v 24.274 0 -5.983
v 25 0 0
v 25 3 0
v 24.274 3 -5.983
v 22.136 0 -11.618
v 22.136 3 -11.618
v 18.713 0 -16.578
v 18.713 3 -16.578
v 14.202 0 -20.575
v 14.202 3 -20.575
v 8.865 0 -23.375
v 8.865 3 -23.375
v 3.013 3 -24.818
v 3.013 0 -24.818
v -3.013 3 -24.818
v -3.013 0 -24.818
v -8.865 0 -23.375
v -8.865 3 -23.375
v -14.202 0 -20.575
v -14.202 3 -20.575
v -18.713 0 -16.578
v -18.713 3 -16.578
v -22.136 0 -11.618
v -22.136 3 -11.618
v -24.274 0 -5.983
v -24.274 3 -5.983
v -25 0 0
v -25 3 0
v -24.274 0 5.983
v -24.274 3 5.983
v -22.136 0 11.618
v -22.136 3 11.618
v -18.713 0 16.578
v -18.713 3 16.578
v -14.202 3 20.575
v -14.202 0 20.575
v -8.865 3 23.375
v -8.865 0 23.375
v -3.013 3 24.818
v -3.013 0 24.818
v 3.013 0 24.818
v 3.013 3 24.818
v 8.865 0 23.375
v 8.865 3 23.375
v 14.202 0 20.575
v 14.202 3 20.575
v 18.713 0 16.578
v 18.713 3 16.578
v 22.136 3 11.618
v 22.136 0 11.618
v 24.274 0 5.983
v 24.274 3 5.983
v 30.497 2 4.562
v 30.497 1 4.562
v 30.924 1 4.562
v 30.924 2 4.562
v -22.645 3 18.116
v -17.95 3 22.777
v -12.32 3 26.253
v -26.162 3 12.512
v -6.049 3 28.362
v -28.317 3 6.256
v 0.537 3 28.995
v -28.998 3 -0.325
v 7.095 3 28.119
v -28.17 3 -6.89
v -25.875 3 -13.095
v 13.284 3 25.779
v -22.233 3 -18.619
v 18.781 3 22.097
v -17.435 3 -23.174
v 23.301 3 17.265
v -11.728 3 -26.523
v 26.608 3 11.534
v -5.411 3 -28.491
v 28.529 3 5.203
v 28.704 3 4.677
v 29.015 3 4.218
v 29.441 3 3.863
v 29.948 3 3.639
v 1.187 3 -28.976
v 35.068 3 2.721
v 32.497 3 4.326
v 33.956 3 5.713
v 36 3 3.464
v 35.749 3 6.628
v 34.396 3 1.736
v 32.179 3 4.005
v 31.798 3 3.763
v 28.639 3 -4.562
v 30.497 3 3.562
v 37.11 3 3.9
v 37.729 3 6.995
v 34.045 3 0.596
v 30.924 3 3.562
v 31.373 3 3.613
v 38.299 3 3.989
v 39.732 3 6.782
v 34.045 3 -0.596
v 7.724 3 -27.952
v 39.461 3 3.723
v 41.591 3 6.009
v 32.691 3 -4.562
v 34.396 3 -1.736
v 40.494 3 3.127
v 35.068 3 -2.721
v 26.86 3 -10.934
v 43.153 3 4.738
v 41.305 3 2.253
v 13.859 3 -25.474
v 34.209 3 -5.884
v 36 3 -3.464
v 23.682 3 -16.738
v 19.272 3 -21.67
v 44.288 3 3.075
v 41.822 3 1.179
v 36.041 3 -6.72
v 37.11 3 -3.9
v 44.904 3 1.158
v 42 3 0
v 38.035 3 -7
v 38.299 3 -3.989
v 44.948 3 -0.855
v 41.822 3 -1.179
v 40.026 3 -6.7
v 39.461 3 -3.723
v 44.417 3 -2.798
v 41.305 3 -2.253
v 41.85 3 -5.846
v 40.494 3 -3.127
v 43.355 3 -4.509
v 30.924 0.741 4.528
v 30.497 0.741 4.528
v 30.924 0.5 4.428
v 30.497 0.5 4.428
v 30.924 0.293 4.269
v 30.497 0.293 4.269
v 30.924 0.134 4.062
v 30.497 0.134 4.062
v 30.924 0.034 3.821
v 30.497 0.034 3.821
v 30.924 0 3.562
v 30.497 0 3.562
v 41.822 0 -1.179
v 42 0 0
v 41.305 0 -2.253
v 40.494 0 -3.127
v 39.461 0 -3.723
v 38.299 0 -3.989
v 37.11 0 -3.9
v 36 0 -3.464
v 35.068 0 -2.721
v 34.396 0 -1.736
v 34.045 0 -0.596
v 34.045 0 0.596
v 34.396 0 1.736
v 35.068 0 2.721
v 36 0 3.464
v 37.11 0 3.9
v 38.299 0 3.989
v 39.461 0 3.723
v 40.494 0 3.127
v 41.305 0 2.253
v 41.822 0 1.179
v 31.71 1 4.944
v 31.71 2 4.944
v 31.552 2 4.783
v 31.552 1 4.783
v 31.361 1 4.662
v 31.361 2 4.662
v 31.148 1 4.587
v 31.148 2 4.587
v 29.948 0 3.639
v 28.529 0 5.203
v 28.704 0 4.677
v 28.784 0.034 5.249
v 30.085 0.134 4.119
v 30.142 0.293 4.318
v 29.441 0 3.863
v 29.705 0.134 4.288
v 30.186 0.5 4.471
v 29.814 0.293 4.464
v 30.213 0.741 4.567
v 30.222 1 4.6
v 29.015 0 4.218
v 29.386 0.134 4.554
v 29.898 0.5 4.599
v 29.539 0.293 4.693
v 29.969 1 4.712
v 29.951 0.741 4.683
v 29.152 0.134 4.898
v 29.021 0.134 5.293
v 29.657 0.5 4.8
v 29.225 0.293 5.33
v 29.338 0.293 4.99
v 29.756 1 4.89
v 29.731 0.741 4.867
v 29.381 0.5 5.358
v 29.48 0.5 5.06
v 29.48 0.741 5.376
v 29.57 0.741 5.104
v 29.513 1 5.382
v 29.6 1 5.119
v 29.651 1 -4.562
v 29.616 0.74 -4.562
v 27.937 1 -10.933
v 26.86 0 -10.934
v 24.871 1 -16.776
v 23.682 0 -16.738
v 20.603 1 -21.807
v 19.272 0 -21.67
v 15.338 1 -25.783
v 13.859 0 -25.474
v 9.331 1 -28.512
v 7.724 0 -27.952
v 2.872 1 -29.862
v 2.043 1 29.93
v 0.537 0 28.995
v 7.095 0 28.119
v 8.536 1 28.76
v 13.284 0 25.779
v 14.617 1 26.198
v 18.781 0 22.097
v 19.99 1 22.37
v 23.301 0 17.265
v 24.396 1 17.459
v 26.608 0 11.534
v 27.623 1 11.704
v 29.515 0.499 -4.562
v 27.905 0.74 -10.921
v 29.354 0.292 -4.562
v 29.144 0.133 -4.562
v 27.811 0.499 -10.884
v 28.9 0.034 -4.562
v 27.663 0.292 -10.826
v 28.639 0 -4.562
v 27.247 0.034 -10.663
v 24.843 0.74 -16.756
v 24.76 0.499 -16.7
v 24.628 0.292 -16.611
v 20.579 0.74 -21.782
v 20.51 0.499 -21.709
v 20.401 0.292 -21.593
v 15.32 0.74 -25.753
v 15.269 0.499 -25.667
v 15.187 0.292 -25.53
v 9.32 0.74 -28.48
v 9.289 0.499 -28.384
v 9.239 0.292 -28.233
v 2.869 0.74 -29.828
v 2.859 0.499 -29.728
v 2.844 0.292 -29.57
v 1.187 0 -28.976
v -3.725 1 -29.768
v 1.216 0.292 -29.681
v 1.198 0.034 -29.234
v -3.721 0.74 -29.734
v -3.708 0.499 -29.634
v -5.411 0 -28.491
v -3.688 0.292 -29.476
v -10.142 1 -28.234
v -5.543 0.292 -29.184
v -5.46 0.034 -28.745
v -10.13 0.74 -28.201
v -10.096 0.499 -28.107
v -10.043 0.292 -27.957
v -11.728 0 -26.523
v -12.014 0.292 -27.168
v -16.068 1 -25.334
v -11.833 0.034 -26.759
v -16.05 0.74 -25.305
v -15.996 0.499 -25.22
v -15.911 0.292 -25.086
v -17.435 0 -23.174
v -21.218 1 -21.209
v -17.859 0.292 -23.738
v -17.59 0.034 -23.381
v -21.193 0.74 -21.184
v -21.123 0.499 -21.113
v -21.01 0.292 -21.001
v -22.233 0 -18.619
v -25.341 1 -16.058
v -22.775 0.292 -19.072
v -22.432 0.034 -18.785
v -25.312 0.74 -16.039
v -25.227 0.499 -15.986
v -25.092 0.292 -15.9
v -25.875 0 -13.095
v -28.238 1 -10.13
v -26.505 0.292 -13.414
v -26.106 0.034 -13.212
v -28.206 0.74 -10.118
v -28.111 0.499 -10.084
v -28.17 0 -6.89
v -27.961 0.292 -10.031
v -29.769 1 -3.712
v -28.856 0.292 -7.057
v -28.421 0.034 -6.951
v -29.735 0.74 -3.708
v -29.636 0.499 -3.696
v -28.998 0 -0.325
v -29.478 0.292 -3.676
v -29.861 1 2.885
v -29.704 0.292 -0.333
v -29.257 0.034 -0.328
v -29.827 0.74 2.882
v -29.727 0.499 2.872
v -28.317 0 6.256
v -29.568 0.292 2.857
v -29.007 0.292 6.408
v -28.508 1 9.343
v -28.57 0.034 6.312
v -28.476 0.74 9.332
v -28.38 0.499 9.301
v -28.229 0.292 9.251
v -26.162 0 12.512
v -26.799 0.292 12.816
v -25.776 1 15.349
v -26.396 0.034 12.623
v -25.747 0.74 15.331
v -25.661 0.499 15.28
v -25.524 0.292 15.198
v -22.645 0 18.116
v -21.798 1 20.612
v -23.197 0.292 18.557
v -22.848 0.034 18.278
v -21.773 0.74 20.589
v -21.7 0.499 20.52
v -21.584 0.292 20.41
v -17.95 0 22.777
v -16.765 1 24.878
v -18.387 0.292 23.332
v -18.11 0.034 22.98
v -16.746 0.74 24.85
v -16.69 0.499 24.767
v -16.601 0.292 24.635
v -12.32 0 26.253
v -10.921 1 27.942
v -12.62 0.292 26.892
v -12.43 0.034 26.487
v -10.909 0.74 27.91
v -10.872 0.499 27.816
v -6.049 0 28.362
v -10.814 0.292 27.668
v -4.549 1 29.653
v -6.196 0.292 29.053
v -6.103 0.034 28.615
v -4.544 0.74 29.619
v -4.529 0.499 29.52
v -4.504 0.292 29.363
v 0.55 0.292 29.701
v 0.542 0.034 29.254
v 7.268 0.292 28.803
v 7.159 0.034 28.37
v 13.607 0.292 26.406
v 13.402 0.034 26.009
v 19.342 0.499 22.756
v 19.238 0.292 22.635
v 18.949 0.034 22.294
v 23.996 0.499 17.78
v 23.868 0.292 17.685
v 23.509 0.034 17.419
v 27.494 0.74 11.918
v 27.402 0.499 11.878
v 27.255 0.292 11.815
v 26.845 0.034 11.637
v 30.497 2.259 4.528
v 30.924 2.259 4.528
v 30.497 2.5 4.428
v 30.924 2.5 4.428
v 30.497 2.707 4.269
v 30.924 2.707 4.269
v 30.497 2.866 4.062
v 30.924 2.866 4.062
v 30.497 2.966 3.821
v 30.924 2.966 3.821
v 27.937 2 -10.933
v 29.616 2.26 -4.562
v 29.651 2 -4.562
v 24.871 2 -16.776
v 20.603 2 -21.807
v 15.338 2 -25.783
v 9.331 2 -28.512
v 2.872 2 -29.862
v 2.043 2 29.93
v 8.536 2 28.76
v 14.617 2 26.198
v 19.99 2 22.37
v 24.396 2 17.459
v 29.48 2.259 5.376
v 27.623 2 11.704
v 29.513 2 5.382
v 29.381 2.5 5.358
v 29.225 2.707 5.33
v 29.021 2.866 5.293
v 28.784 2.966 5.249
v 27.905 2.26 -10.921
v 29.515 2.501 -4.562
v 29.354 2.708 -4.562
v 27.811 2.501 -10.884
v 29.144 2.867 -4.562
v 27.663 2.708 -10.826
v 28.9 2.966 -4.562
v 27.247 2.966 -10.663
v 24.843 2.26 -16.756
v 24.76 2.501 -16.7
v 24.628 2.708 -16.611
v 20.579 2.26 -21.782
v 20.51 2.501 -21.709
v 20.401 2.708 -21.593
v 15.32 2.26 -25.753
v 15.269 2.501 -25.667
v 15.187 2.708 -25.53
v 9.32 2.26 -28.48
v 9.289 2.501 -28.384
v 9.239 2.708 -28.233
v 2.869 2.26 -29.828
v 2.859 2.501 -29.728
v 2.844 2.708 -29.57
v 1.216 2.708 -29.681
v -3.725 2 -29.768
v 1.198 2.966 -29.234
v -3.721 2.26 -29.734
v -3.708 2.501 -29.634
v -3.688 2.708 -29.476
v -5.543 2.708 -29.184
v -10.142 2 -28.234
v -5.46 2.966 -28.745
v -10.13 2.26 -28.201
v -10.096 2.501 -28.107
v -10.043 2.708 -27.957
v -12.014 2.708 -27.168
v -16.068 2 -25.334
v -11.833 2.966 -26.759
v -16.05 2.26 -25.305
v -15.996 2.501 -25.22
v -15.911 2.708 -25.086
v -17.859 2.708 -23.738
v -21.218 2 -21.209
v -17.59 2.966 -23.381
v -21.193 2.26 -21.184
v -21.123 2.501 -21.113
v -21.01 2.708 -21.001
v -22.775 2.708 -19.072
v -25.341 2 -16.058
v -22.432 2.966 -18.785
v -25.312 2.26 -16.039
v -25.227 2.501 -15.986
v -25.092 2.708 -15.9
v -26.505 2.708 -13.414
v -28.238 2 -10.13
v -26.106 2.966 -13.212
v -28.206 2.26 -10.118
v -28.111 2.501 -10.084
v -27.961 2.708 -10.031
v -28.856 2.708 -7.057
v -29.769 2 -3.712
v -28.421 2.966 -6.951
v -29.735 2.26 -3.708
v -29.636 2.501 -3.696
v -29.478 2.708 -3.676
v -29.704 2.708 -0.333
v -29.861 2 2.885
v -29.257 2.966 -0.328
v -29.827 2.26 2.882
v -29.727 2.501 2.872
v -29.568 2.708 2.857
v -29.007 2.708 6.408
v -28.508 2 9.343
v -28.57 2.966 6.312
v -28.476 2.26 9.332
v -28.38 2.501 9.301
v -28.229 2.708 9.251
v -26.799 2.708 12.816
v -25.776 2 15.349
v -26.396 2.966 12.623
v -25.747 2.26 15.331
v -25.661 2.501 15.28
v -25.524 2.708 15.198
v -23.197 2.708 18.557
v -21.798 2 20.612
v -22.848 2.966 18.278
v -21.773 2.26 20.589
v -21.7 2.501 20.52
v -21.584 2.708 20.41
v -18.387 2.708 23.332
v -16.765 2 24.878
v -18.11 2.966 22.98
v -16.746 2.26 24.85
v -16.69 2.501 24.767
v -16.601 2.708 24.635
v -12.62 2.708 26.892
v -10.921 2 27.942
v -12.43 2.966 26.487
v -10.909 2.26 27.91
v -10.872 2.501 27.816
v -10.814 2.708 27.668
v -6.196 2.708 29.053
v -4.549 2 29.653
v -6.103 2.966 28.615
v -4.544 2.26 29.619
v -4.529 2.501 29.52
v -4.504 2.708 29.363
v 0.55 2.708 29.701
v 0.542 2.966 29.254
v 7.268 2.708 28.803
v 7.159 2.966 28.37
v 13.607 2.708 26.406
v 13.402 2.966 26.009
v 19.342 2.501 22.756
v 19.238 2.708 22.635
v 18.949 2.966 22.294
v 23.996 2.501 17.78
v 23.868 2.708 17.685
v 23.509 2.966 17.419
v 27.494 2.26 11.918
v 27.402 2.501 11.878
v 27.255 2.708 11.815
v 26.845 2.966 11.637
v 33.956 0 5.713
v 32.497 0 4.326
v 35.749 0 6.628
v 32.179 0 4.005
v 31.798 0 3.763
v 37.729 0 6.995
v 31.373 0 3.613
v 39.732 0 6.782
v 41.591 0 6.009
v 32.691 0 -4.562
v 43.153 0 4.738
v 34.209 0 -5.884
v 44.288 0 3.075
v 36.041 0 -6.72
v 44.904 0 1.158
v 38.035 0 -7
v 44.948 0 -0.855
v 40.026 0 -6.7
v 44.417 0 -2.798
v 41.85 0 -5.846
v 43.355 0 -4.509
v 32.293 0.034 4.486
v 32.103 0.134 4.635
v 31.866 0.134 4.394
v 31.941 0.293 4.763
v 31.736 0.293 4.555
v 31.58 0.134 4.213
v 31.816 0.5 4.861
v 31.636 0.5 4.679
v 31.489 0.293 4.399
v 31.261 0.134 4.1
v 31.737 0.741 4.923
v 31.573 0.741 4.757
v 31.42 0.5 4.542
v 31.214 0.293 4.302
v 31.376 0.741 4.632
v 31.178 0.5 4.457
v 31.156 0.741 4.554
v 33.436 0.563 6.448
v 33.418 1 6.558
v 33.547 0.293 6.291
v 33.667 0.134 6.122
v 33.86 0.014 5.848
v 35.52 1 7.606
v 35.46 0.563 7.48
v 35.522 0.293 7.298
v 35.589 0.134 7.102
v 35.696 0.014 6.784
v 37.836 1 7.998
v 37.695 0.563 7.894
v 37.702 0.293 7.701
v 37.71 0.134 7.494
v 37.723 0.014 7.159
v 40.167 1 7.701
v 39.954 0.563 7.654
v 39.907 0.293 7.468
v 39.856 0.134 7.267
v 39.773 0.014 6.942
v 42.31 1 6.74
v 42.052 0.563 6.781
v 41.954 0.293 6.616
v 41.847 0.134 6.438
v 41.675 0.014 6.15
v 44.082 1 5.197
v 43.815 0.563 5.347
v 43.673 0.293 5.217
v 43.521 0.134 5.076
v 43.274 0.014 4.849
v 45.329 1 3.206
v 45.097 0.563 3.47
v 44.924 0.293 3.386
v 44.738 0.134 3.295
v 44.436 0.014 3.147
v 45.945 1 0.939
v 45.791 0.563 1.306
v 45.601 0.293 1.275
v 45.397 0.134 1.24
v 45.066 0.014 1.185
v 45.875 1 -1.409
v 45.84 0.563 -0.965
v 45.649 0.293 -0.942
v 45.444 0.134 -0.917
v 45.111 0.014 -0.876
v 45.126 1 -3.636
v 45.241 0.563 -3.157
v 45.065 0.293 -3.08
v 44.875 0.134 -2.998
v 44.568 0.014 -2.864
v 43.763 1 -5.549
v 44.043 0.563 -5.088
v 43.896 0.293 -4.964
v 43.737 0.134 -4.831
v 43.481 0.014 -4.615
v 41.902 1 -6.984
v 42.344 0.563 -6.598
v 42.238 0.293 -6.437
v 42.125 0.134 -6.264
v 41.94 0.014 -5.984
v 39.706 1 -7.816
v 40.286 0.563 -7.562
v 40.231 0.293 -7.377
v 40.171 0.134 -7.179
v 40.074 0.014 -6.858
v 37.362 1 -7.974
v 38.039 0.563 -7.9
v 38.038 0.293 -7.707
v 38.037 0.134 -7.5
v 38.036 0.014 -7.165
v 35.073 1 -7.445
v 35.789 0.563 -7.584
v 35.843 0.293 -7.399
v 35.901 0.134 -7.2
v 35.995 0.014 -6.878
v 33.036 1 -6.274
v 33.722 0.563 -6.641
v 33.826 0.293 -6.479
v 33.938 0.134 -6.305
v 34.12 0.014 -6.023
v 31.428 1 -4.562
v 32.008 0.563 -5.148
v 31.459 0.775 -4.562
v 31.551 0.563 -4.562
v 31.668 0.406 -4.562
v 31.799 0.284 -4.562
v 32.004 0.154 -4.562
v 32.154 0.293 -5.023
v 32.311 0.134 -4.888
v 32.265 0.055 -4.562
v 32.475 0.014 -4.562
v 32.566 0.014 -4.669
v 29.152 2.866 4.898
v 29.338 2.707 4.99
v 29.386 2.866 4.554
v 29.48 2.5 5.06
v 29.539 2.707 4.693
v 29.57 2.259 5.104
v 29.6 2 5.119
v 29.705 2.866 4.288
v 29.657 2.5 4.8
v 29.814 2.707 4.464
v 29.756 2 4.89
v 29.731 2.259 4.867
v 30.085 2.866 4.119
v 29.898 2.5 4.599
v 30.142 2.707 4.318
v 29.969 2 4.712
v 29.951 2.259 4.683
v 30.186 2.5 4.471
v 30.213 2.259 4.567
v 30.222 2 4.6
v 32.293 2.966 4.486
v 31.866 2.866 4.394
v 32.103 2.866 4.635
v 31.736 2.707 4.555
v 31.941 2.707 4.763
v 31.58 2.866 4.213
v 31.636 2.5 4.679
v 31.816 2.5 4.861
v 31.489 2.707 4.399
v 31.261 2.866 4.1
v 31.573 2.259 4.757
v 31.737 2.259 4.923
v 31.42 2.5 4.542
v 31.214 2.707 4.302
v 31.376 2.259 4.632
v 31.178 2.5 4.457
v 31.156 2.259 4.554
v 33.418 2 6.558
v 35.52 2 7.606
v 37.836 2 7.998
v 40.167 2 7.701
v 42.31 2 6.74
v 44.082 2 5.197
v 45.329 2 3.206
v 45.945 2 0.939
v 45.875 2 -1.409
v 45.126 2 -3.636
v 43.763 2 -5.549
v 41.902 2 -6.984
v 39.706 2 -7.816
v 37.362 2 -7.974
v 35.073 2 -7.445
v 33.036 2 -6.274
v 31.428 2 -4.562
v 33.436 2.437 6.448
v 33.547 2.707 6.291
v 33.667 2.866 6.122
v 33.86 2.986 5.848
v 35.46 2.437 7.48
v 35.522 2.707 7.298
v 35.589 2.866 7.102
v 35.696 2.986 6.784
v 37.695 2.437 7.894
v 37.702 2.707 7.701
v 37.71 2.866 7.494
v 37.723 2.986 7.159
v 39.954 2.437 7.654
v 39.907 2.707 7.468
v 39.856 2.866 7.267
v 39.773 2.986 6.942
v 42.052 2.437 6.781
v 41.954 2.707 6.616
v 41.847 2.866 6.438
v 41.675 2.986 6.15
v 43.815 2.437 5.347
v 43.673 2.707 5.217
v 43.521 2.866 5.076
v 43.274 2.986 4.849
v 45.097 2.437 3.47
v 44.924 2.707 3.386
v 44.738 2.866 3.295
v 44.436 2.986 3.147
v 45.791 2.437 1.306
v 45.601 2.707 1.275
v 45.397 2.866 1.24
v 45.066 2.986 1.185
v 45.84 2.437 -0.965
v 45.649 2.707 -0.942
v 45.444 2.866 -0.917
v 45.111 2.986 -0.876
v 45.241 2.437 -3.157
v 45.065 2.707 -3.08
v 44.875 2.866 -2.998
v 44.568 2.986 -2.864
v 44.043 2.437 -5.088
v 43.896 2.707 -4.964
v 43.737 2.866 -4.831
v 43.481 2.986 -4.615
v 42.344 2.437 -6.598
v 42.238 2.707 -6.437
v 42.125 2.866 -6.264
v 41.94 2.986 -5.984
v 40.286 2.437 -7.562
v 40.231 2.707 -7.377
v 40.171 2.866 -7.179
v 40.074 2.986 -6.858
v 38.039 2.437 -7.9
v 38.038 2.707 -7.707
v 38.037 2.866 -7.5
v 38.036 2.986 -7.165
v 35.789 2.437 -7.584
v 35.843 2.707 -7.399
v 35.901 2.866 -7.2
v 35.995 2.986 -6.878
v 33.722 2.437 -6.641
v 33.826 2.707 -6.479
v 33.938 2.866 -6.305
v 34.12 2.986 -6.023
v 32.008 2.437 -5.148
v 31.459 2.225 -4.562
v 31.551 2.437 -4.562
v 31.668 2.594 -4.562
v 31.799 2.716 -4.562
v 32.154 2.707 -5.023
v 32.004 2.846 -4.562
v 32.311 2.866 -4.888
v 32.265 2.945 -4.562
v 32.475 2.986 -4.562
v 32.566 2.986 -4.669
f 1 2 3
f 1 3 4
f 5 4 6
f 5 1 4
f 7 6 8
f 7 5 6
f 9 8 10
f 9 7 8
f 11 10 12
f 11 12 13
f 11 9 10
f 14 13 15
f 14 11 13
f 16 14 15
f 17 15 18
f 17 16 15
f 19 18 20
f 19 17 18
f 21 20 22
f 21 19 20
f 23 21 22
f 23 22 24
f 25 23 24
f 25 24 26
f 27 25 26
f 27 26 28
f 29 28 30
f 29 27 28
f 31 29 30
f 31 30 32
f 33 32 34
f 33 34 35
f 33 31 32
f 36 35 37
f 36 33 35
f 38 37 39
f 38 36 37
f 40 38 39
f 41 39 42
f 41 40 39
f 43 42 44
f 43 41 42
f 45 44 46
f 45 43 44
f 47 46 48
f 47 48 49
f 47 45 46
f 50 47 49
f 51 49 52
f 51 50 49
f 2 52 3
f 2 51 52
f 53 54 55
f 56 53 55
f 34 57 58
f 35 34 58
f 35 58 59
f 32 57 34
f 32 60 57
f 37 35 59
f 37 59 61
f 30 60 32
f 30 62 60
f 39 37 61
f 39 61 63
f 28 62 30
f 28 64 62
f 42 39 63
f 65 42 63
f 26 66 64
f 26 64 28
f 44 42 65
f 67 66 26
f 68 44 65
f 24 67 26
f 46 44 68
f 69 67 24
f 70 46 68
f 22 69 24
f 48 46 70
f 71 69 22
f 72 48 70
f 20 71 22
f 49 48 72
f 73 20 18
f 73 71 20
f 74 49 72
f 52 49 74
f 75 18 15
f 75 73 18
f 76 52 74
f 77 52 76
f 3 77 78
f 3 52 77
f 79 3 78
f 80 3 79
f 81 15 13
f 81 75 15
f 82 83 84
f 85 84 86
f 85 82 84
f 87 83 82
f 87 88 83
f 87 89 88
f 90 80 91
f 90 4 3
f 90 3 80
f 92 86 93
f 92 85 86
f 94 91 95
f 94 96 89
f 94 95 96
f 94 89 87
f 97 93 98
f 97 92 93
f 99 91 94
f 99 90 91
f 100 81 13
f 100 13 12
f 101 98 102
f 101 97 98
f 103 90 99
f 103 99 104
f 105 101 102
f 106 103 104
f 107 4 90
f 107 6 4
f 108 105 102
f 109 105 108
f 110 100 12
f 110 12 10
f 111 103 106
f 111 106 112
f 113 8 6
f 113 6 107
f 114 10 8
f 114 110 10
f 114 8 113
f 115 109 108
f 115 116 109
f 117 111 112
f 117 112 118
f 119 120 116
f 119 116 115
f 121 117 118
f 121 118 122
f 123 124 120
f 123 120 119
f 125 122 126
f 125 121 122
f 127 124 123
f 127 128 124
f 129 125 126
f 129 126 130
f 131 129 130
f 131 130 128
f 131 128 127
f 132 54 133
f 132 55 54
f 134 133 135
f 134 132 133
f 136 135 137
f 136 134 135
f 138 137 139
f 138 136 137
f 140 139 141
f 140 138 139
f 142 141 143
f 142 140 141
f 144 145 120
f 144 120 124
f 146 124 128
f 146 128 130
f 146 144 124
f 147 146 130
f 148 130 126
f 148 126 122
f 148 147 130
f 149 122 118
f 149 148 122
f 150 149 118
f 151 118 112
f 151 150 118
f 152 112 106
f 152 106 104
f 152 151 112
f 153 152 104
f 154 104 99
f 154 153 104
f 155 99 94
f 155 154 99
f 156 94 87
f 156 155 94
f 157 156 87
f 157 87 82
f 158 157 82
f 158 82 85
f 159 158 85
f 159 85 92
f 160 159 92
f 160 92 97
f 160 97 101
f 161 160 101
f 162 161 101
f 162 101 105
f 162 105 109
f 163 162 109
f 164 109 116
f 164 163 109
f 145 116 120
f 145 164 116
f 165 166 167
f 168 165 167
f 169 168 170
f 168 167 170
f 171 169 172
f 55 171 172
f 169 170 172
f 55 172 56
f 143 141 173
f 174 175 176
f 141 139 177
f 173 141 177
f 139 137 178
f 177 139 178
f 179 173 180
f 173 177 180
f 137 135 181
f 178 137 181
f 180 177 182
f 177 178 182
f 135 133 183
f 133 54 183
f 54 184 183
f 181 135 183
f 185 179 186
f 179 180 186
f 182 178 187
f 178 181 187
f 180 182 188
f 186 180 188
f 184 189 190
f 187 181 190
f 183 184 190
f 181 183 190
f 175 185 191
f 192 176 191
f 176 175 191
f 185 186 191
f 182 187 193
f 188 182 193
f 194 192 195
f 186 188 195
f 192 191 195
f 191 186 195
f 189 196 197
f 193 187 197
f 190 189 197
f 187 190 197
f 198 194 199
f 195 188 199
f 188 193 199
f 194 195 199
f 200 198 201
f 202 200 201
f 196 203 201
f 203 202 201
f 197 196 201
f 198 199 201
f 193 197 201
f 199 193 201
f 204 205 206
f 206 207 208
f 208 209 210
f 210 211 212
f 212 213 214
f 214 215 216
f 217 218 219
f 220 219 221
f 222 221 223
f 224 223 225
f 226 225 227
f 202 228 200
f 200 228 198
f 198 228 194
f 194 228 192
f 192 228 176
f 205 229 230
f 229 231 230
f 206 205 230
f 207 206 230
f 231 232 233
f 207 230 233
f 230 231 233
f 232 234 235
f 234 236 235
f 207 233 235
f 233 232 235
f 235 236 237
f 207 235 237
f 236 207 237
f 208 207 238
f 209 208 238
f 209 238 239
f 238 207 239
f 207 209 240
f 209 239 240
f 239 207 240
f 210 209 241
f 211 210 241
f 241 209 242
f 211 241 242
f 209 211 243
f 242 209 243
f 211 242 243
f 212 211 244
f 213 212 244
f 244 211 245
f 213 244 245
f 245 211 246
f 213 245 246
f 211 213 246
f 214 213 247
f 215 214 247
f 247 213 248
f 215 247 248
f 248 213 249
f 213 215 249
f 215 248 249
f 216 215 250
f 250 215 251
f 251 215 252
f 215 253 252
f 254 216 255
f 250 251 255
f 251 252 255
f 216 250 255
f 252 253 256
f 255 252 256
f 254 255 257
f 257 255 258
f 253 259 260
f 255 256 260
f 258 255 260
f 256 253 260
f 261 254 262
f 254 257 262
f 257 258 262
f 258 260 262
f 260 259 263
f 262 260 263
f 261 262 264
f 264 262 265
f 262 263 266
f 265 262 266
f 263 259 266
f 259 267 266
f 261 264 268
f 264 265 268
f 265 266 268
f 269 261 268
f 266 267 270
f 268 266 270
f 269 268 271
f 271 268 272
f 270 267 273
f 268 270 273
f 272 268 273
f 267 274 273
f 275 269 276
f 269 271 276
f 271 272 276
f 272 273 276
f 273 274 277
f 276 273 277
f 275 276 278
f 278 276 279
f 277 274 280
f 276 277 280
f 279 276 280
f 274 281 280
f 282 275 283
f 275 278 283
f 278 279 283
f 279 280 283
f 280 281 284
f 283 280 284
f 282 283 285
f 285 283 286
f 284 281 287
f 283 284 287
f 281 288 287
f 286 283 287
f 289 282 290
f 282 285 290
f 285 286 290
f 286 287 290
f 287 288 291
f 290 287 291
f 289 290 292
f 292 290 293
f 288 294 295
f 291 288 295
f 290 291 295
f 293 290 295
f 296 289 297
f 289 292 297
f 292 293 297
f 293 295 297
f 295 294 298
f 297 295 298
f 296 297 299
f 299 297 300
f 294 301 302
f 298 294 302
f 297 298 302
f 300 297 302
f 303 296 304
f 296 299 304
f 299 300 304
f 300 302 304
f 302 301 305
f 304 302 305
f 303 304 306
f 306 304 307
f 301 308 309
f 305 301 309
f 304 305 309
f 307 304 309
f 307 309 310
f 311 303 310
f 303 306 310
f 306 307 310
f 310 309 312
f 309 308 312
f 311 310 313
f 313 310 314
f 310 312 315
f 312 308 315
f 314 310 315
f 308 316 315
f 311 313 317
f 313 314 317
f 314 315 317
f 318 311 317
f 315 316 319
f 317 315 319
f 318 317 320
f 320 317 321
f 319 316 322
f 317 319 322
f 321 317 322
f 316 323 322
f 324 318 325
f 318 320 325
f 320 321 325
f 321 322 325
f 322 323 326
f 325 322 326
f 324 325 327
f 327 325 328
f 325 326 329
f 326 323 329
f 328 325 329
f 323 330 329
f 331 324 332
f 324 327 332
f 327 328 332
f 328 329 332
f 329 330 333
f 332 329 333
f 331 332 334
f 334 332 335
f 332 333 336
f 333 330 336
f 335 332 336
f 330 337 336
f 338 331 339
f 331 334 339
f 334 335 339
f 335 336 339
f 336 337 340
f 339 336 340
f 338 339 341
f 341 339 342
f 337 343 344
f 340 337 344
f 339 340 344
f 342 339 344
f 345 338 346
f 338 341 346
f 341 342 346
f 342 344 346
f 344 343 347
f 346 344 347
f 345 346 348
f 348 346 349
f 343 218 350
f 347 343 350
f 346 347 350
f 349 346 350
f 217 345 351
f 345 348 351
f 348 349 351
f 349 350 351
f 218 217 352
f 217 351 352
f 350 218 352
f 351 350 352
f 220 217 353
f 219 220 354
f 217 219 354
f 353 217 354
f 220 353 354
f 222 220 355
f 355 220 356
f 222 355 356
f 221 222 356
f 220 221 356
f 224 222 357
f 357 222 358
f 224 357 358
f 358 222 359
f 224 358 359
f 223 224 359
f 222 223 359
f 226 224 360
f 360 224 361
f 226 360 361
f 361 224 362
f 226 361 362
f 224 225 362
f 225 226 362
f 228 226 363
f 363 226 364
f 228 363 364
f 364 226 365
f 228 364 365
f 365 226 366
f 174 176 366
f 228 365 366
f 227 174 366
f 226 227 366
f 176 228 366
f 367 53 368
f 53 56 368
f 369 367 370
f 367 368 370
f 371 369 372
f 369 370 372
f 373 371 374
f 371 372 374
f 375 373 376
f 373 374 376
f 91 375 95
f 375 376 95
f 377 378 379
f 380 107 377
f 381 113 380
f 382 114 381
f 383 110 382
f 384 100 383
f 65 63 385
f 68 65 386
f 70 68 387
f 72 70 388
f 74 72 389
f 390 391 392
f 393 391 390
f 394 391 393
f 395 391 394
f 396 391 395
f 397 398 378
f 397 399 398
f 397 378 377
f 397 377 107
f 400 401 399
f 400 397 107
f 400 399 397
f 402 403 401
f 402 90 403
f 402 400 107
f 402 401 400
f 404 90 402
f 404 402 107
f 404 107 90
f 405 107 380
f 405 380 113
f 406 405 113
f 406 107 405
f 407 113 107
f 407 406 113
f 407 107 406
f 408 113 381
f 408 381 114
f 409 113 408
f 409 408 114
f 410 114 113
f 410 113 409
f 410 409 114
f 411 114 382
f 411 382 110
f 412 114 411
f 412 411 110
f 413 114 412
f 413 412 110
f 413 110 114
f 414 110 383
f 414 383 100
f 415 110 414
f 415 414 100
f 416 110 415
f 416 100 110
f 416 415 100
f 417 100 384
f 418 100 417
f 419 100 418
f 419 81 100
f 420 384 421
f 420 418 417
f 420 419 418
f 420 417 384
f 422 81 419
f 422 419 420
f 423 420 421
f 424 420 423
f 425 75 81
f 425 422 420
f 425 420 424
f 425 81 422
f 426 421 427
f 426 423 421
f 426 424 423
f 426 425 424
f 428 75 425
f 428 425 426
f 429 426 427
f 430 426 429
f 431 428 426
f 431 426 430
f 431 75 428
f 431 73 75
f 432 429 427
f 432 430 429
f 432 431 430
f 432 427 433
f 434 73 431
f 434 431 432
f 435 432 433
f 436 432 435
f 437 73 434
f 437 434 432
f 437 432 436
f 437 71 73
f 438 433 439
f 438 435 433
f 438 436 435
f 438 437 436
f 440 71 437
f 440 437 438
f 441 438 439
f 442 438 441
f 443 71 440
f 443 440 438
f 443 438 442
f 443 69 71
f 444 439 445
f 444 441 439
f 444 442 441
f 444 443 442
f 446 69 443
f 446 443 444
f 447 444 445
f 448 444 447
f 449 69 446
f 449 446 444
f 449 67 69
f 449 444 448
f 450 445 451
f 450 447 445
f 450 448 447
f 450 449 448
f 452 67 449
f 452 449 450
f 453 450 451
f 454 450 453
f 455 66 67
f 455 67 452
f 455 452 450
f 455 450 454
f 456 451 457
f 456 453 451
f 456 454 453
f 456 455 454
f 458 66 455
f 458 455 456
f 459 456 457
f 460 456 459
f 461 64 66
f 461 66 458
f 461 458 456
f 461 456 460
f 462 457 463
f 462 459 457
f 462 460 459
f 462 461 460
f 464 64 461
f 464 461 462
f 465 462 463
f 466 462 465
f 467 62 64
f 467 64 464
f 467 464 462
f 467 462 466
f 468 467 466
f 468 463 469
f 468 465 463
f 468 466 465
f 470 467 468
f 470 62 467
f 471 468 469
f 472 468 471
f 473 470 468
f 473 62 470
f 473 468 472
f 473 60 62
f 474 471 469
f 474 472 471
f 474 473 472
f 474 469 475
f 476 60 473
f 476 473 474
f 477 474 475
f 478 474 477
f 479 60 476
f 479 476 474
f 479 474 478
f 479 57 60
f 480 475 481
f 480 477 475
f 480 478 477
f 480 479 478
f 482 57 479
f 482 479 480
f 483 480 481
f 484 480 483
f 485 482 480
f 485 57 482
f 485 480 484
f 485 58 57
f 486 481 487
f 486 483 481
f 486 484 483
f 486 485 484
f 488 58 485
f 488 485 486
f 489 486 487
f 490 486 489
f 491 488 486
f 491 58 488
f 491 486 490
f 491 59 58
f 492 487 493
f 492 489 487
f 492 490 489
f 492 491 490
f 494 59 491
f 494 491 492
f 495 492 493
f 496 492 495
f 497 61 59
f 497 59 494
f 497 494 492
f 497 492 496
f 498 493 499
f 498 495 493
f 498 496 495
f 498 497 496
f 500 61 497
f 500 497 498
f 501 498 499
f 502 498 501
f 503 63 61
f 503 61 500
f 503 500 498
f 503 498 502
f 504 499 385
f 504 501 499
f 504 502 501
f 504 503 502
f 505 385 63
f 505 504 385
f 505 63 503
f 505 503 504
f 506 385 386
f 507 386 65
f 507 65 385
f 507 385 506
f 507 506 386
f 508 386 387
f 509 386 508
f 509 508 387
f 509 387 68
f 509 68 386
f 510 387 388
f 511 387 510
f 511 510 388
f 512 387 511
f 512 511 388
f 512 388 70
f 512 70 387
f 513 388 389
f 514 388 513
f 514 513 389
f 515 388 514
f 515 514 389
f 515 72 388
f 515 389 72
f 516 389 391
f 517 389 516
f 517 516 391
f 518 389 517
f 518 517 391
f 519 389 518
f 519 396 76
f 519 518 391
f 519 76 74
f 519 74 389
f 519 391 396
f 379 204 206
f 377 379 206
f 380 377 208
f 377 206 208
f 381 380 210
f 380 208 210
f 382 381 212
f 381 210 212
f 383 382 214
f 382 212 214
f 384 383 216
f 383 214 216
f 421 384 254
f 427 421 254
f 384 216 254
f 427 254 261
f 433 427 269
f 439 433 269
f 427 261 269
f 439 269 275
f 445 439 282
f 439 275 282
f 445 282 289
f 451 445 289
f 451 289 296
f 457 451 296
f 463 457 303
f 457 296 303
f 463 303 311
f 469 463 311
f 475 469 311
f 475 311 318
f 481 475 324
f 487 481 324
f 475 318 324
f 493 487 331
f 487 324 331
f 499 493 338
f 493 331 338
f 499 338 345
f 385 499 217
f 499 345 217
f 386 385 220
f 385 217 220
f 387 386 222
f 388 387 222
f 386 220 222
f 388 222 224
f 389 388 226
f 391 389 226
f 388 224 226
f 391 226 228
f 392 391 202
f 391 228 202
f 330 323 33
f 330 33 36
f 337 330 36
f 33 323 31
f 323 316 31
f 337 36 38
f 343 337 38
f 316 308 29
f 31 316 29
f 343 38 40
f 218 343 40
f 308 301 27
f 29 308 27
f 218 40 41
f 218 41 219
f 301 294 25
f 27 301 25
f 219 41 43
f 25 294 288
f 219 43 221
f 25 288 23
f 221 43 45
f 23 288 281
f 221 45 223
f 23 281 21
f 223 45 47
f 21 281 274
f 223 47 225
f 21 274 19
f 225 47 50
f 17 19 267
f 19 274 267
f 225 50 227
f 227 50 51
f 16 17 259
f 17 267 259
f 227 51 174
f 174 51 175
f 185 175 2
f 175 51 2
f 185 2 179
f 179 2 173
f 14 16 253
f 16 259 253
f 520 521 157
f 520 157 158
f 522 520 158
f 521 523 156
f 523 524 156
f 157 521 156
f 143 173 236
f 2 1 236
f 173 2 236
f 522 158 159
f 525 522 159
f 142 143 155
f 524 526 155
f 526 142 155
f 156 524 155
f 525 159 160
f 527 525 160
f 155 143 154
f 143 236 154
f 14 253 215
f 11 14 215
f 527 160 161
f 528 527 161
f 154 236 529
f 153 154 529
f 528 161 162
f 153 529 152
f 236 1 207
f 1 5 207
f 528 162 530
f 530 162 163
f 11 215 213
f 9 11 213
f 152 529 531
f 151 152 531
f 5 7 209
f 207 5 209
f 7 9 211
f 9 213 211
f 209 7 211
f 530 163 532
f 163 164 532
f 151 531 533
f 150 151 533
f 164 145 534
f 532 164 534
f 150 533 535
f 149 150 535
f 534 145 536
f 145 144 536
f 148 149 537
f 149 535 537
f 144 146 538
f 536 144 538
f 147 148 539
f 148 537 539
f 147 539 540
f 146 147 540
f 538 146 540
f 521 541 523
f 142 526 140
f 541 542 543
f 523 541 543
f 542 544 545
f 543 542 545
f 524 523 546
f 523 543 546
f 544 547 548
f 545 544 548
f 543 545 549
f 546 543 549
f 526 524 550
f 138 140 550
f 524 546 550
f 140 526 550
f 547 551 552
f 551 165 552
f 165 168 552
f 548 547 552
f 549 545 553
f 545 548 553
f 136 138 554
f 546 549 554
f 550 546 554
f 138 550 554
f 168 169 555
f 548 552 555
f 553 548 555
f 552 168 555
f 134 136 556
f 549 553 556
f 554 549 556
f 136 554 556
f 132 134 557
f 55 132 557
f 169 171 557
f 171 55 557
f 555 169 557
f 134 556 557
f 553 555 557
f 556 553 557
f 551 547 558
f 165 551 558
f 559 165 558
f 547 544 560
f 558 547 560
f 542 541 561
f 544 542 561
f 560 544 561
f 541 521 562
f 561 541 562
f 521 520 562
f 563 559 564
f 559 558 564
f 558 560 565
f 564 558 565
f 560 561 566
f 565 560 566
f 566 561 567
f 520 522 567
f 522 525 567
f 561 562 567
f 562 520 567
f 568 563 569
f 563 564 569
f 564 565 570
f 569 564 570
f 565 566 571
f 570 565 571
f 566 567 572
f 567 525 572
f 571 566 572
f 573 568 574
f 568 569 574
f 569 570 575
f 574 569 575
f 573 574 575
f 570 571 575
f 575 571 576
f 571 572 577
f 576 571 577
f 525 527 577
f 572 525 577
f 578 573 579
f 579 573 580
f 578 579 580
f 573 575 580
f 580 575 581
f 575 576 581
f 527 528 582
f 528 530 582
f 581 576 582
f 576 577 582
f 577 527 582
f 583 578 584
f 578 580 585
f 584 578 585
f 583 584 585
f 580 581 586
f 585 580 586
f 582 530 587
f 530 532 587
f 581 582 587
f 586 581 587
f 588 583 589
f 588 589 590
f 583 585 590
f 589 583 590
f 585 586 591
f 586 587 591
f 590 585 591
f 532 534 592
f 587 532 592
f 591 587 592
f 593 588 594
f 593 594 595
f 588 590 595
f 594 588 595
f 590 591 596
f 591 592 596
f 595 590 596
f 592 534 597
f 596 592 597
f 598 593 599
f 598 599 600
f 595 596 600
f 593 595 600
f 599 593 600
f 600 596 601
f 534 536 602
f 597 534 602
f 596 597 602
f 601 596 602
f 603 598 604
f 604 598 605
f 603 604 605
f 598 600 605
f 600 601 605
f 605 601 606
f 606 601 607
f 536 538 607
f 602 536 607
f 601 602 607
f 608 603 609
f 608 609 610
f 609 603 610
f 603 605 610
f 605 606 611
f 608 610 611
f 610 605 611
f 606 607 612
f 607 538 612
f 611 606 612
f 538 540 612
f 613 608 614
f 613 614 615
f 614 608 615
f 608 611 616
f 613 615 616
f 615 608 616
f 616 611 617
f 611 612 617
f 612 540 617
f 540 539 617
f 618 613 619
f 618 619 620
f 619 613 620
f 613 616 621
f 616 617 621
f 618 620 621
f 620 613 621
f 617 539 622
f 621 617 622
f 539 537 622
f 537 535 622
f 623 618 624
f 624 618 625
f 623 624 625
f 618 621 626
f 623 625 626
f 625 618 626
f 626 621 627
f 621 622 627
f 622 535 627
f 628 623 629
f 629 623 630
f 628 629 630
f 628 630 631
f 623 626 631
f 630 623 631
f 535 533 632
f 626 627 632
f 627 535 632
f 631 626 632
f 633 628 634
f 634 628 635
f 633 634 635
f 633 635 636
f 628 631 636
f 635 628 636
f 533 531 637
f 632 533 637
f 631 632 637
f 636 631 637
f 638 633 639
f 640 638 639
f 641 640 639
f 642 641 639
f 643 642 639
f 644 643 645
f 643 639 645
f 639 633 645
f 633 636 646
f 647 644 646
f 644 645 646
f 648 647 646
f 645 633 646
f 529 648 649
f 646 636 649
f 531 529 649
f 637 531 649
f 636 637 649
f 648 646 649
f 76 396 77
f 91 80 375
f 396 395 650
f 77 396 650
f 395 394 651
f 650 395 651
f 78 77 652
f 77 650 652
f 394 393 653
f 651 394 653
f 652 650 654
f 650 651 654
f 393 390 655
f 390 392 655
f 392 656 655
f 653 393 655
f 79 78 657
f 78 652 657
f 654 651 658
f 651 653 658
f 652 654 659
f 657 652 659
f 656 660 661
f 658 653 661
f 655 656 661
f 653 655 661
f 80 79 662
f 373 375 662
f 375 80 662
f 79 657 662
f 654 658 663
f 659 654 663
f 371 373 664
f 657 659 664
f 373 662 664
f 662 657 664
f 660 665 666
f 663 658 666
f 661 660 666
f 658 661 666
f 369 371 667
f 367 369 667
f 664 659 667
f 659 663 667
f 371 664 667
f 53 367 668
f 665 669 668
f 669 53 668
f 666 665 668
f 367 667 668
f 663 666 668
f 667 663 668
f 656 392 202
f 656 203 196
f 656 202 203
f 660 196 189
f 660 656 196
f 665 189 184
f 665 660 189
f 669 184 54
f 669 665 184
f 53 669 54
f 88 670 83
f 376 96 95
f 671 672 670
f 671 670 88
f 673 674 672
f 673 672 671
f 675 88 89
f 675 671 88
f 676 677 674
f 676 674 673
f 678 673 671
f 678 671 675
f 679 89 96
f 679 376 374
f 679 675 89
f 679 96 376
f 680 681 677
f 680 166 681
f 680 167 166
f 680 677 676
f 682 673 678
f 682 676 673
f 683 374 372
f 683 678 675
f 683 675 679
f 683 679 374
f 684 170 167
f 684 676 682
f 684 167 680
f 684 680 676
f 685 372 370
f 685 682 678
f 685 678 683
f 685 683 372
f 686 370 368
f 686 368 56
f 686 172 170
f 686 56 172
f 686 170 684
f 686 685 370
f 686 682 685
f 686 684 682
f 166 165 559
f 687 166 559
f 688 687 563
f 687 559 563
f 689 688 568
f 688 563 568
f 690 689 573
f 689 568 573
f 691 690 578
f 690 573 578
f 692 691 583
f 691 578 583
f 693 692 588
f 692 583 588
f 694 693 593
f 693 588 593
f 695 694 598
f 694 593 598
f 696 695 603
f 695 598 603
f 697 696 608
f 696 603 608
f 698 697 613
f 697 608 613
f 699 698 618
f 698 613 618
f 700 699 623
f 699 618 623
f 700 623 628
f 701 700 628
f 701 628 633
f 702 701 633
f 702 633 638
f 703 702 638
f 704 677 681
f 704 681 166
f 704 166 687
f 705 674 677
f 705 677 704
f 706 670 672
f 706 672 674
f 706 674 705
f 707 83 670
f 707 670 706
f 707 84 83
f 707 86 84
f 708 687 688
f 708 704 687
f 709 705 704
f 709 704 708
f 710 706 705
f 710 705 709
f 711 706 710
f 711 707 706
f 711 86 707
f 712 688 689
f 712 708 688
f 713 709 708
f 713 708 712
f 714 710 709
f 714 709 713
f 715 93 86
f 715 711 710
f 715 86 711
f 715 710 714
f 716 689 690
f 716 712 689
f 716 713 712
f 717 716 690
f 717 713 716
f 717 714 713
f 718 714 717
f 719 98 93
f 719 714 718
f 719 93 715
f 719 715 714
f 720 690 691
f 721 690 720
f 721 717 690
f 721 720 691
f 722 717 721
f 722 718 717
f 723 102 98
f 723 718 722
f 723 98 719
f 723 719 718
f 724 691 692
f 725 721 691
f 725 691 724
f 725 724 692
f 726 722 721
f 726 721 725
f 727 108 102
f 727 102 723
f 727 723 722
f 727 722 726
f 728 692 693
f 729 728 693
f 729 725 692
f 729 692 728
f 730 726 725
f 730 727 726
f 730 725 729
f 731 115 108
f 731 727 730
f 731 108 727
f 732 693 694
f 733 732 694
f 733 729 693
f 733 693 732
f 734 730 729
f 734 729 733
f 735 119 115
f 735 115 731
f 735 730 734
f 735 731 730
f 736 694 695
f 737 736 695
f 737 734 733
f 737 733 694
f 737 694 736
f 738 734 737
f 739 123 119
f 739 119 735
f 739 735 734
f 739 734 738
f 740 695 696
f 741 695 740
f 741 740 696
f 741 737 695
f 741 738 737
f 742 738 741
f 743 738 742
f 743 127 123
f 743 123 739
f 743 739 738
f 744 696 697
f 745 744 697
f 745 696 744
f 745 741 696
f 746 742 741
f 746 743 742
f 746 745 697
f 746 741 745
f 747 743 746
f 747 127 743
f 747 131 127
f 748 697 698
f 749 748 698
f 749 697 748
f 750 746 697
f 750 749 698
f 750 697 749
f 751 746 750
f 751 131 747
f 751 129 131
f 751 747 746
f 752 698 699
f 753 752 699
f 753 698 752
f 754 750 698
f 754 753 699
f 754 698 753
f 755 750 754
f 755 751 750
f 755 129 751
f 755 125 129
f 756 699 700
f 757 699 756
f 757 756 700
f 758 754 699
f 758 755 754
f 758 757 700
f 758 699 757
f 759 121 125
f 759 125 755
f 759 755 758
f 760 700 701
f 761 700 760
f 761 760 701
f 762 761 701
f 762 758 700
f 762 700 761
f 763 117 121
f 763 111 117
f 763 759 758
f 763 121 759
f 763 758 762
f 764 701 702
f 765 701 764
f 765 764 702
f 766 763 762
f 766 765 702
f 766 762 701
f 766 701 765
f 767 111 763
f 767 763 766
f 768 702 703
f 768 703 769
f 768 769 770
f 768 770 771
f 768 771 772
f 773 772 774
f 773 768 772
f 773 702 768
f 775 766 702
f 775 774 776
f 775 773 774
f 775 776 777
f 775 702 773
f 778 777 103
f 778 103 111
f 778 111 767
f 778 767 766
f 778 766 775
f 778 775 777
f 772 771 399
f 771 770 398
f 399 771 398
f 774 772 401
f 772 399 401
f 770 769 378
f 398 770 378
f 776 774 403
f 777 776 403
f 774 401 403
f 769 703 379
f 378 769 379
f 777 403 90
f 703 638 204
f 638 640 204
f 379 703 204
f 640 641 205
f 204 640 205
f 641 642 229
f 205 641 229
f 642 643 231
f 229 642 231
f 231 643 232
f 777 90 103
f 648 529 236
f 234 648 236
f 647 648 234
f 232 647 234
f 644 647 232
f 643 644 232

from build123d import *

# Parameters (mm, degrees)
SKETCH1_R           = 25
SKETCH1_R_2         = 4
BOSS_EXTRUDE1_DEPTH = 3
FILLET1_R           = 1


with BuildPart() as part:
    # Sketch1 → Boss-Extrude1 (new body)
    with BuildSketch(Plane(origin=(0, 0, 0), x_dir=(1, 0, 0), z_dir=(0, 1, 0))):
        with BuildLine():
            Line((31.428037515, 4.561722164), (29.651149909, 4.561722164))
            ThreePointArc((29.651149909, 4.561722164), (-30, 0), (29.651149909, -4.561722164))
            Line((29.651149909, -4.561722164), (31.428037515, -4.561722164))
            ThreePointArc((31.428037515, -4.561722164), (46, 0), (31.428037515, 4.561722164))
        make_face()
        Circle(SKETCH1_R, mode=Mode.SUBTRACT)
        with Locations((38, 0)):
            Circle(SKETCH1_R_2, mode=Mode.SUBTRACT)
    extrude(amount=BOSS_EXTRUDE1_DEPTH)

    # Fillet1
    fillet1_edges = [part.edges().sort_by_distance(p)[0] for p in [
        (30.539593712, 0, 4.561722164),
        (-30, 0, 0),
        (30.539593712, 3, 4.561722164),
        (31.428037515, 1.5, 4.561722164),
        (29.651149909, 1.5, 4.561722164),
        (46, 3, 0),
        (-30, 3, 0),
        (46, 0, 0),
    ]]
    fillet(fillet1_edges, radius=FILLET1_R)


solid = part.part
